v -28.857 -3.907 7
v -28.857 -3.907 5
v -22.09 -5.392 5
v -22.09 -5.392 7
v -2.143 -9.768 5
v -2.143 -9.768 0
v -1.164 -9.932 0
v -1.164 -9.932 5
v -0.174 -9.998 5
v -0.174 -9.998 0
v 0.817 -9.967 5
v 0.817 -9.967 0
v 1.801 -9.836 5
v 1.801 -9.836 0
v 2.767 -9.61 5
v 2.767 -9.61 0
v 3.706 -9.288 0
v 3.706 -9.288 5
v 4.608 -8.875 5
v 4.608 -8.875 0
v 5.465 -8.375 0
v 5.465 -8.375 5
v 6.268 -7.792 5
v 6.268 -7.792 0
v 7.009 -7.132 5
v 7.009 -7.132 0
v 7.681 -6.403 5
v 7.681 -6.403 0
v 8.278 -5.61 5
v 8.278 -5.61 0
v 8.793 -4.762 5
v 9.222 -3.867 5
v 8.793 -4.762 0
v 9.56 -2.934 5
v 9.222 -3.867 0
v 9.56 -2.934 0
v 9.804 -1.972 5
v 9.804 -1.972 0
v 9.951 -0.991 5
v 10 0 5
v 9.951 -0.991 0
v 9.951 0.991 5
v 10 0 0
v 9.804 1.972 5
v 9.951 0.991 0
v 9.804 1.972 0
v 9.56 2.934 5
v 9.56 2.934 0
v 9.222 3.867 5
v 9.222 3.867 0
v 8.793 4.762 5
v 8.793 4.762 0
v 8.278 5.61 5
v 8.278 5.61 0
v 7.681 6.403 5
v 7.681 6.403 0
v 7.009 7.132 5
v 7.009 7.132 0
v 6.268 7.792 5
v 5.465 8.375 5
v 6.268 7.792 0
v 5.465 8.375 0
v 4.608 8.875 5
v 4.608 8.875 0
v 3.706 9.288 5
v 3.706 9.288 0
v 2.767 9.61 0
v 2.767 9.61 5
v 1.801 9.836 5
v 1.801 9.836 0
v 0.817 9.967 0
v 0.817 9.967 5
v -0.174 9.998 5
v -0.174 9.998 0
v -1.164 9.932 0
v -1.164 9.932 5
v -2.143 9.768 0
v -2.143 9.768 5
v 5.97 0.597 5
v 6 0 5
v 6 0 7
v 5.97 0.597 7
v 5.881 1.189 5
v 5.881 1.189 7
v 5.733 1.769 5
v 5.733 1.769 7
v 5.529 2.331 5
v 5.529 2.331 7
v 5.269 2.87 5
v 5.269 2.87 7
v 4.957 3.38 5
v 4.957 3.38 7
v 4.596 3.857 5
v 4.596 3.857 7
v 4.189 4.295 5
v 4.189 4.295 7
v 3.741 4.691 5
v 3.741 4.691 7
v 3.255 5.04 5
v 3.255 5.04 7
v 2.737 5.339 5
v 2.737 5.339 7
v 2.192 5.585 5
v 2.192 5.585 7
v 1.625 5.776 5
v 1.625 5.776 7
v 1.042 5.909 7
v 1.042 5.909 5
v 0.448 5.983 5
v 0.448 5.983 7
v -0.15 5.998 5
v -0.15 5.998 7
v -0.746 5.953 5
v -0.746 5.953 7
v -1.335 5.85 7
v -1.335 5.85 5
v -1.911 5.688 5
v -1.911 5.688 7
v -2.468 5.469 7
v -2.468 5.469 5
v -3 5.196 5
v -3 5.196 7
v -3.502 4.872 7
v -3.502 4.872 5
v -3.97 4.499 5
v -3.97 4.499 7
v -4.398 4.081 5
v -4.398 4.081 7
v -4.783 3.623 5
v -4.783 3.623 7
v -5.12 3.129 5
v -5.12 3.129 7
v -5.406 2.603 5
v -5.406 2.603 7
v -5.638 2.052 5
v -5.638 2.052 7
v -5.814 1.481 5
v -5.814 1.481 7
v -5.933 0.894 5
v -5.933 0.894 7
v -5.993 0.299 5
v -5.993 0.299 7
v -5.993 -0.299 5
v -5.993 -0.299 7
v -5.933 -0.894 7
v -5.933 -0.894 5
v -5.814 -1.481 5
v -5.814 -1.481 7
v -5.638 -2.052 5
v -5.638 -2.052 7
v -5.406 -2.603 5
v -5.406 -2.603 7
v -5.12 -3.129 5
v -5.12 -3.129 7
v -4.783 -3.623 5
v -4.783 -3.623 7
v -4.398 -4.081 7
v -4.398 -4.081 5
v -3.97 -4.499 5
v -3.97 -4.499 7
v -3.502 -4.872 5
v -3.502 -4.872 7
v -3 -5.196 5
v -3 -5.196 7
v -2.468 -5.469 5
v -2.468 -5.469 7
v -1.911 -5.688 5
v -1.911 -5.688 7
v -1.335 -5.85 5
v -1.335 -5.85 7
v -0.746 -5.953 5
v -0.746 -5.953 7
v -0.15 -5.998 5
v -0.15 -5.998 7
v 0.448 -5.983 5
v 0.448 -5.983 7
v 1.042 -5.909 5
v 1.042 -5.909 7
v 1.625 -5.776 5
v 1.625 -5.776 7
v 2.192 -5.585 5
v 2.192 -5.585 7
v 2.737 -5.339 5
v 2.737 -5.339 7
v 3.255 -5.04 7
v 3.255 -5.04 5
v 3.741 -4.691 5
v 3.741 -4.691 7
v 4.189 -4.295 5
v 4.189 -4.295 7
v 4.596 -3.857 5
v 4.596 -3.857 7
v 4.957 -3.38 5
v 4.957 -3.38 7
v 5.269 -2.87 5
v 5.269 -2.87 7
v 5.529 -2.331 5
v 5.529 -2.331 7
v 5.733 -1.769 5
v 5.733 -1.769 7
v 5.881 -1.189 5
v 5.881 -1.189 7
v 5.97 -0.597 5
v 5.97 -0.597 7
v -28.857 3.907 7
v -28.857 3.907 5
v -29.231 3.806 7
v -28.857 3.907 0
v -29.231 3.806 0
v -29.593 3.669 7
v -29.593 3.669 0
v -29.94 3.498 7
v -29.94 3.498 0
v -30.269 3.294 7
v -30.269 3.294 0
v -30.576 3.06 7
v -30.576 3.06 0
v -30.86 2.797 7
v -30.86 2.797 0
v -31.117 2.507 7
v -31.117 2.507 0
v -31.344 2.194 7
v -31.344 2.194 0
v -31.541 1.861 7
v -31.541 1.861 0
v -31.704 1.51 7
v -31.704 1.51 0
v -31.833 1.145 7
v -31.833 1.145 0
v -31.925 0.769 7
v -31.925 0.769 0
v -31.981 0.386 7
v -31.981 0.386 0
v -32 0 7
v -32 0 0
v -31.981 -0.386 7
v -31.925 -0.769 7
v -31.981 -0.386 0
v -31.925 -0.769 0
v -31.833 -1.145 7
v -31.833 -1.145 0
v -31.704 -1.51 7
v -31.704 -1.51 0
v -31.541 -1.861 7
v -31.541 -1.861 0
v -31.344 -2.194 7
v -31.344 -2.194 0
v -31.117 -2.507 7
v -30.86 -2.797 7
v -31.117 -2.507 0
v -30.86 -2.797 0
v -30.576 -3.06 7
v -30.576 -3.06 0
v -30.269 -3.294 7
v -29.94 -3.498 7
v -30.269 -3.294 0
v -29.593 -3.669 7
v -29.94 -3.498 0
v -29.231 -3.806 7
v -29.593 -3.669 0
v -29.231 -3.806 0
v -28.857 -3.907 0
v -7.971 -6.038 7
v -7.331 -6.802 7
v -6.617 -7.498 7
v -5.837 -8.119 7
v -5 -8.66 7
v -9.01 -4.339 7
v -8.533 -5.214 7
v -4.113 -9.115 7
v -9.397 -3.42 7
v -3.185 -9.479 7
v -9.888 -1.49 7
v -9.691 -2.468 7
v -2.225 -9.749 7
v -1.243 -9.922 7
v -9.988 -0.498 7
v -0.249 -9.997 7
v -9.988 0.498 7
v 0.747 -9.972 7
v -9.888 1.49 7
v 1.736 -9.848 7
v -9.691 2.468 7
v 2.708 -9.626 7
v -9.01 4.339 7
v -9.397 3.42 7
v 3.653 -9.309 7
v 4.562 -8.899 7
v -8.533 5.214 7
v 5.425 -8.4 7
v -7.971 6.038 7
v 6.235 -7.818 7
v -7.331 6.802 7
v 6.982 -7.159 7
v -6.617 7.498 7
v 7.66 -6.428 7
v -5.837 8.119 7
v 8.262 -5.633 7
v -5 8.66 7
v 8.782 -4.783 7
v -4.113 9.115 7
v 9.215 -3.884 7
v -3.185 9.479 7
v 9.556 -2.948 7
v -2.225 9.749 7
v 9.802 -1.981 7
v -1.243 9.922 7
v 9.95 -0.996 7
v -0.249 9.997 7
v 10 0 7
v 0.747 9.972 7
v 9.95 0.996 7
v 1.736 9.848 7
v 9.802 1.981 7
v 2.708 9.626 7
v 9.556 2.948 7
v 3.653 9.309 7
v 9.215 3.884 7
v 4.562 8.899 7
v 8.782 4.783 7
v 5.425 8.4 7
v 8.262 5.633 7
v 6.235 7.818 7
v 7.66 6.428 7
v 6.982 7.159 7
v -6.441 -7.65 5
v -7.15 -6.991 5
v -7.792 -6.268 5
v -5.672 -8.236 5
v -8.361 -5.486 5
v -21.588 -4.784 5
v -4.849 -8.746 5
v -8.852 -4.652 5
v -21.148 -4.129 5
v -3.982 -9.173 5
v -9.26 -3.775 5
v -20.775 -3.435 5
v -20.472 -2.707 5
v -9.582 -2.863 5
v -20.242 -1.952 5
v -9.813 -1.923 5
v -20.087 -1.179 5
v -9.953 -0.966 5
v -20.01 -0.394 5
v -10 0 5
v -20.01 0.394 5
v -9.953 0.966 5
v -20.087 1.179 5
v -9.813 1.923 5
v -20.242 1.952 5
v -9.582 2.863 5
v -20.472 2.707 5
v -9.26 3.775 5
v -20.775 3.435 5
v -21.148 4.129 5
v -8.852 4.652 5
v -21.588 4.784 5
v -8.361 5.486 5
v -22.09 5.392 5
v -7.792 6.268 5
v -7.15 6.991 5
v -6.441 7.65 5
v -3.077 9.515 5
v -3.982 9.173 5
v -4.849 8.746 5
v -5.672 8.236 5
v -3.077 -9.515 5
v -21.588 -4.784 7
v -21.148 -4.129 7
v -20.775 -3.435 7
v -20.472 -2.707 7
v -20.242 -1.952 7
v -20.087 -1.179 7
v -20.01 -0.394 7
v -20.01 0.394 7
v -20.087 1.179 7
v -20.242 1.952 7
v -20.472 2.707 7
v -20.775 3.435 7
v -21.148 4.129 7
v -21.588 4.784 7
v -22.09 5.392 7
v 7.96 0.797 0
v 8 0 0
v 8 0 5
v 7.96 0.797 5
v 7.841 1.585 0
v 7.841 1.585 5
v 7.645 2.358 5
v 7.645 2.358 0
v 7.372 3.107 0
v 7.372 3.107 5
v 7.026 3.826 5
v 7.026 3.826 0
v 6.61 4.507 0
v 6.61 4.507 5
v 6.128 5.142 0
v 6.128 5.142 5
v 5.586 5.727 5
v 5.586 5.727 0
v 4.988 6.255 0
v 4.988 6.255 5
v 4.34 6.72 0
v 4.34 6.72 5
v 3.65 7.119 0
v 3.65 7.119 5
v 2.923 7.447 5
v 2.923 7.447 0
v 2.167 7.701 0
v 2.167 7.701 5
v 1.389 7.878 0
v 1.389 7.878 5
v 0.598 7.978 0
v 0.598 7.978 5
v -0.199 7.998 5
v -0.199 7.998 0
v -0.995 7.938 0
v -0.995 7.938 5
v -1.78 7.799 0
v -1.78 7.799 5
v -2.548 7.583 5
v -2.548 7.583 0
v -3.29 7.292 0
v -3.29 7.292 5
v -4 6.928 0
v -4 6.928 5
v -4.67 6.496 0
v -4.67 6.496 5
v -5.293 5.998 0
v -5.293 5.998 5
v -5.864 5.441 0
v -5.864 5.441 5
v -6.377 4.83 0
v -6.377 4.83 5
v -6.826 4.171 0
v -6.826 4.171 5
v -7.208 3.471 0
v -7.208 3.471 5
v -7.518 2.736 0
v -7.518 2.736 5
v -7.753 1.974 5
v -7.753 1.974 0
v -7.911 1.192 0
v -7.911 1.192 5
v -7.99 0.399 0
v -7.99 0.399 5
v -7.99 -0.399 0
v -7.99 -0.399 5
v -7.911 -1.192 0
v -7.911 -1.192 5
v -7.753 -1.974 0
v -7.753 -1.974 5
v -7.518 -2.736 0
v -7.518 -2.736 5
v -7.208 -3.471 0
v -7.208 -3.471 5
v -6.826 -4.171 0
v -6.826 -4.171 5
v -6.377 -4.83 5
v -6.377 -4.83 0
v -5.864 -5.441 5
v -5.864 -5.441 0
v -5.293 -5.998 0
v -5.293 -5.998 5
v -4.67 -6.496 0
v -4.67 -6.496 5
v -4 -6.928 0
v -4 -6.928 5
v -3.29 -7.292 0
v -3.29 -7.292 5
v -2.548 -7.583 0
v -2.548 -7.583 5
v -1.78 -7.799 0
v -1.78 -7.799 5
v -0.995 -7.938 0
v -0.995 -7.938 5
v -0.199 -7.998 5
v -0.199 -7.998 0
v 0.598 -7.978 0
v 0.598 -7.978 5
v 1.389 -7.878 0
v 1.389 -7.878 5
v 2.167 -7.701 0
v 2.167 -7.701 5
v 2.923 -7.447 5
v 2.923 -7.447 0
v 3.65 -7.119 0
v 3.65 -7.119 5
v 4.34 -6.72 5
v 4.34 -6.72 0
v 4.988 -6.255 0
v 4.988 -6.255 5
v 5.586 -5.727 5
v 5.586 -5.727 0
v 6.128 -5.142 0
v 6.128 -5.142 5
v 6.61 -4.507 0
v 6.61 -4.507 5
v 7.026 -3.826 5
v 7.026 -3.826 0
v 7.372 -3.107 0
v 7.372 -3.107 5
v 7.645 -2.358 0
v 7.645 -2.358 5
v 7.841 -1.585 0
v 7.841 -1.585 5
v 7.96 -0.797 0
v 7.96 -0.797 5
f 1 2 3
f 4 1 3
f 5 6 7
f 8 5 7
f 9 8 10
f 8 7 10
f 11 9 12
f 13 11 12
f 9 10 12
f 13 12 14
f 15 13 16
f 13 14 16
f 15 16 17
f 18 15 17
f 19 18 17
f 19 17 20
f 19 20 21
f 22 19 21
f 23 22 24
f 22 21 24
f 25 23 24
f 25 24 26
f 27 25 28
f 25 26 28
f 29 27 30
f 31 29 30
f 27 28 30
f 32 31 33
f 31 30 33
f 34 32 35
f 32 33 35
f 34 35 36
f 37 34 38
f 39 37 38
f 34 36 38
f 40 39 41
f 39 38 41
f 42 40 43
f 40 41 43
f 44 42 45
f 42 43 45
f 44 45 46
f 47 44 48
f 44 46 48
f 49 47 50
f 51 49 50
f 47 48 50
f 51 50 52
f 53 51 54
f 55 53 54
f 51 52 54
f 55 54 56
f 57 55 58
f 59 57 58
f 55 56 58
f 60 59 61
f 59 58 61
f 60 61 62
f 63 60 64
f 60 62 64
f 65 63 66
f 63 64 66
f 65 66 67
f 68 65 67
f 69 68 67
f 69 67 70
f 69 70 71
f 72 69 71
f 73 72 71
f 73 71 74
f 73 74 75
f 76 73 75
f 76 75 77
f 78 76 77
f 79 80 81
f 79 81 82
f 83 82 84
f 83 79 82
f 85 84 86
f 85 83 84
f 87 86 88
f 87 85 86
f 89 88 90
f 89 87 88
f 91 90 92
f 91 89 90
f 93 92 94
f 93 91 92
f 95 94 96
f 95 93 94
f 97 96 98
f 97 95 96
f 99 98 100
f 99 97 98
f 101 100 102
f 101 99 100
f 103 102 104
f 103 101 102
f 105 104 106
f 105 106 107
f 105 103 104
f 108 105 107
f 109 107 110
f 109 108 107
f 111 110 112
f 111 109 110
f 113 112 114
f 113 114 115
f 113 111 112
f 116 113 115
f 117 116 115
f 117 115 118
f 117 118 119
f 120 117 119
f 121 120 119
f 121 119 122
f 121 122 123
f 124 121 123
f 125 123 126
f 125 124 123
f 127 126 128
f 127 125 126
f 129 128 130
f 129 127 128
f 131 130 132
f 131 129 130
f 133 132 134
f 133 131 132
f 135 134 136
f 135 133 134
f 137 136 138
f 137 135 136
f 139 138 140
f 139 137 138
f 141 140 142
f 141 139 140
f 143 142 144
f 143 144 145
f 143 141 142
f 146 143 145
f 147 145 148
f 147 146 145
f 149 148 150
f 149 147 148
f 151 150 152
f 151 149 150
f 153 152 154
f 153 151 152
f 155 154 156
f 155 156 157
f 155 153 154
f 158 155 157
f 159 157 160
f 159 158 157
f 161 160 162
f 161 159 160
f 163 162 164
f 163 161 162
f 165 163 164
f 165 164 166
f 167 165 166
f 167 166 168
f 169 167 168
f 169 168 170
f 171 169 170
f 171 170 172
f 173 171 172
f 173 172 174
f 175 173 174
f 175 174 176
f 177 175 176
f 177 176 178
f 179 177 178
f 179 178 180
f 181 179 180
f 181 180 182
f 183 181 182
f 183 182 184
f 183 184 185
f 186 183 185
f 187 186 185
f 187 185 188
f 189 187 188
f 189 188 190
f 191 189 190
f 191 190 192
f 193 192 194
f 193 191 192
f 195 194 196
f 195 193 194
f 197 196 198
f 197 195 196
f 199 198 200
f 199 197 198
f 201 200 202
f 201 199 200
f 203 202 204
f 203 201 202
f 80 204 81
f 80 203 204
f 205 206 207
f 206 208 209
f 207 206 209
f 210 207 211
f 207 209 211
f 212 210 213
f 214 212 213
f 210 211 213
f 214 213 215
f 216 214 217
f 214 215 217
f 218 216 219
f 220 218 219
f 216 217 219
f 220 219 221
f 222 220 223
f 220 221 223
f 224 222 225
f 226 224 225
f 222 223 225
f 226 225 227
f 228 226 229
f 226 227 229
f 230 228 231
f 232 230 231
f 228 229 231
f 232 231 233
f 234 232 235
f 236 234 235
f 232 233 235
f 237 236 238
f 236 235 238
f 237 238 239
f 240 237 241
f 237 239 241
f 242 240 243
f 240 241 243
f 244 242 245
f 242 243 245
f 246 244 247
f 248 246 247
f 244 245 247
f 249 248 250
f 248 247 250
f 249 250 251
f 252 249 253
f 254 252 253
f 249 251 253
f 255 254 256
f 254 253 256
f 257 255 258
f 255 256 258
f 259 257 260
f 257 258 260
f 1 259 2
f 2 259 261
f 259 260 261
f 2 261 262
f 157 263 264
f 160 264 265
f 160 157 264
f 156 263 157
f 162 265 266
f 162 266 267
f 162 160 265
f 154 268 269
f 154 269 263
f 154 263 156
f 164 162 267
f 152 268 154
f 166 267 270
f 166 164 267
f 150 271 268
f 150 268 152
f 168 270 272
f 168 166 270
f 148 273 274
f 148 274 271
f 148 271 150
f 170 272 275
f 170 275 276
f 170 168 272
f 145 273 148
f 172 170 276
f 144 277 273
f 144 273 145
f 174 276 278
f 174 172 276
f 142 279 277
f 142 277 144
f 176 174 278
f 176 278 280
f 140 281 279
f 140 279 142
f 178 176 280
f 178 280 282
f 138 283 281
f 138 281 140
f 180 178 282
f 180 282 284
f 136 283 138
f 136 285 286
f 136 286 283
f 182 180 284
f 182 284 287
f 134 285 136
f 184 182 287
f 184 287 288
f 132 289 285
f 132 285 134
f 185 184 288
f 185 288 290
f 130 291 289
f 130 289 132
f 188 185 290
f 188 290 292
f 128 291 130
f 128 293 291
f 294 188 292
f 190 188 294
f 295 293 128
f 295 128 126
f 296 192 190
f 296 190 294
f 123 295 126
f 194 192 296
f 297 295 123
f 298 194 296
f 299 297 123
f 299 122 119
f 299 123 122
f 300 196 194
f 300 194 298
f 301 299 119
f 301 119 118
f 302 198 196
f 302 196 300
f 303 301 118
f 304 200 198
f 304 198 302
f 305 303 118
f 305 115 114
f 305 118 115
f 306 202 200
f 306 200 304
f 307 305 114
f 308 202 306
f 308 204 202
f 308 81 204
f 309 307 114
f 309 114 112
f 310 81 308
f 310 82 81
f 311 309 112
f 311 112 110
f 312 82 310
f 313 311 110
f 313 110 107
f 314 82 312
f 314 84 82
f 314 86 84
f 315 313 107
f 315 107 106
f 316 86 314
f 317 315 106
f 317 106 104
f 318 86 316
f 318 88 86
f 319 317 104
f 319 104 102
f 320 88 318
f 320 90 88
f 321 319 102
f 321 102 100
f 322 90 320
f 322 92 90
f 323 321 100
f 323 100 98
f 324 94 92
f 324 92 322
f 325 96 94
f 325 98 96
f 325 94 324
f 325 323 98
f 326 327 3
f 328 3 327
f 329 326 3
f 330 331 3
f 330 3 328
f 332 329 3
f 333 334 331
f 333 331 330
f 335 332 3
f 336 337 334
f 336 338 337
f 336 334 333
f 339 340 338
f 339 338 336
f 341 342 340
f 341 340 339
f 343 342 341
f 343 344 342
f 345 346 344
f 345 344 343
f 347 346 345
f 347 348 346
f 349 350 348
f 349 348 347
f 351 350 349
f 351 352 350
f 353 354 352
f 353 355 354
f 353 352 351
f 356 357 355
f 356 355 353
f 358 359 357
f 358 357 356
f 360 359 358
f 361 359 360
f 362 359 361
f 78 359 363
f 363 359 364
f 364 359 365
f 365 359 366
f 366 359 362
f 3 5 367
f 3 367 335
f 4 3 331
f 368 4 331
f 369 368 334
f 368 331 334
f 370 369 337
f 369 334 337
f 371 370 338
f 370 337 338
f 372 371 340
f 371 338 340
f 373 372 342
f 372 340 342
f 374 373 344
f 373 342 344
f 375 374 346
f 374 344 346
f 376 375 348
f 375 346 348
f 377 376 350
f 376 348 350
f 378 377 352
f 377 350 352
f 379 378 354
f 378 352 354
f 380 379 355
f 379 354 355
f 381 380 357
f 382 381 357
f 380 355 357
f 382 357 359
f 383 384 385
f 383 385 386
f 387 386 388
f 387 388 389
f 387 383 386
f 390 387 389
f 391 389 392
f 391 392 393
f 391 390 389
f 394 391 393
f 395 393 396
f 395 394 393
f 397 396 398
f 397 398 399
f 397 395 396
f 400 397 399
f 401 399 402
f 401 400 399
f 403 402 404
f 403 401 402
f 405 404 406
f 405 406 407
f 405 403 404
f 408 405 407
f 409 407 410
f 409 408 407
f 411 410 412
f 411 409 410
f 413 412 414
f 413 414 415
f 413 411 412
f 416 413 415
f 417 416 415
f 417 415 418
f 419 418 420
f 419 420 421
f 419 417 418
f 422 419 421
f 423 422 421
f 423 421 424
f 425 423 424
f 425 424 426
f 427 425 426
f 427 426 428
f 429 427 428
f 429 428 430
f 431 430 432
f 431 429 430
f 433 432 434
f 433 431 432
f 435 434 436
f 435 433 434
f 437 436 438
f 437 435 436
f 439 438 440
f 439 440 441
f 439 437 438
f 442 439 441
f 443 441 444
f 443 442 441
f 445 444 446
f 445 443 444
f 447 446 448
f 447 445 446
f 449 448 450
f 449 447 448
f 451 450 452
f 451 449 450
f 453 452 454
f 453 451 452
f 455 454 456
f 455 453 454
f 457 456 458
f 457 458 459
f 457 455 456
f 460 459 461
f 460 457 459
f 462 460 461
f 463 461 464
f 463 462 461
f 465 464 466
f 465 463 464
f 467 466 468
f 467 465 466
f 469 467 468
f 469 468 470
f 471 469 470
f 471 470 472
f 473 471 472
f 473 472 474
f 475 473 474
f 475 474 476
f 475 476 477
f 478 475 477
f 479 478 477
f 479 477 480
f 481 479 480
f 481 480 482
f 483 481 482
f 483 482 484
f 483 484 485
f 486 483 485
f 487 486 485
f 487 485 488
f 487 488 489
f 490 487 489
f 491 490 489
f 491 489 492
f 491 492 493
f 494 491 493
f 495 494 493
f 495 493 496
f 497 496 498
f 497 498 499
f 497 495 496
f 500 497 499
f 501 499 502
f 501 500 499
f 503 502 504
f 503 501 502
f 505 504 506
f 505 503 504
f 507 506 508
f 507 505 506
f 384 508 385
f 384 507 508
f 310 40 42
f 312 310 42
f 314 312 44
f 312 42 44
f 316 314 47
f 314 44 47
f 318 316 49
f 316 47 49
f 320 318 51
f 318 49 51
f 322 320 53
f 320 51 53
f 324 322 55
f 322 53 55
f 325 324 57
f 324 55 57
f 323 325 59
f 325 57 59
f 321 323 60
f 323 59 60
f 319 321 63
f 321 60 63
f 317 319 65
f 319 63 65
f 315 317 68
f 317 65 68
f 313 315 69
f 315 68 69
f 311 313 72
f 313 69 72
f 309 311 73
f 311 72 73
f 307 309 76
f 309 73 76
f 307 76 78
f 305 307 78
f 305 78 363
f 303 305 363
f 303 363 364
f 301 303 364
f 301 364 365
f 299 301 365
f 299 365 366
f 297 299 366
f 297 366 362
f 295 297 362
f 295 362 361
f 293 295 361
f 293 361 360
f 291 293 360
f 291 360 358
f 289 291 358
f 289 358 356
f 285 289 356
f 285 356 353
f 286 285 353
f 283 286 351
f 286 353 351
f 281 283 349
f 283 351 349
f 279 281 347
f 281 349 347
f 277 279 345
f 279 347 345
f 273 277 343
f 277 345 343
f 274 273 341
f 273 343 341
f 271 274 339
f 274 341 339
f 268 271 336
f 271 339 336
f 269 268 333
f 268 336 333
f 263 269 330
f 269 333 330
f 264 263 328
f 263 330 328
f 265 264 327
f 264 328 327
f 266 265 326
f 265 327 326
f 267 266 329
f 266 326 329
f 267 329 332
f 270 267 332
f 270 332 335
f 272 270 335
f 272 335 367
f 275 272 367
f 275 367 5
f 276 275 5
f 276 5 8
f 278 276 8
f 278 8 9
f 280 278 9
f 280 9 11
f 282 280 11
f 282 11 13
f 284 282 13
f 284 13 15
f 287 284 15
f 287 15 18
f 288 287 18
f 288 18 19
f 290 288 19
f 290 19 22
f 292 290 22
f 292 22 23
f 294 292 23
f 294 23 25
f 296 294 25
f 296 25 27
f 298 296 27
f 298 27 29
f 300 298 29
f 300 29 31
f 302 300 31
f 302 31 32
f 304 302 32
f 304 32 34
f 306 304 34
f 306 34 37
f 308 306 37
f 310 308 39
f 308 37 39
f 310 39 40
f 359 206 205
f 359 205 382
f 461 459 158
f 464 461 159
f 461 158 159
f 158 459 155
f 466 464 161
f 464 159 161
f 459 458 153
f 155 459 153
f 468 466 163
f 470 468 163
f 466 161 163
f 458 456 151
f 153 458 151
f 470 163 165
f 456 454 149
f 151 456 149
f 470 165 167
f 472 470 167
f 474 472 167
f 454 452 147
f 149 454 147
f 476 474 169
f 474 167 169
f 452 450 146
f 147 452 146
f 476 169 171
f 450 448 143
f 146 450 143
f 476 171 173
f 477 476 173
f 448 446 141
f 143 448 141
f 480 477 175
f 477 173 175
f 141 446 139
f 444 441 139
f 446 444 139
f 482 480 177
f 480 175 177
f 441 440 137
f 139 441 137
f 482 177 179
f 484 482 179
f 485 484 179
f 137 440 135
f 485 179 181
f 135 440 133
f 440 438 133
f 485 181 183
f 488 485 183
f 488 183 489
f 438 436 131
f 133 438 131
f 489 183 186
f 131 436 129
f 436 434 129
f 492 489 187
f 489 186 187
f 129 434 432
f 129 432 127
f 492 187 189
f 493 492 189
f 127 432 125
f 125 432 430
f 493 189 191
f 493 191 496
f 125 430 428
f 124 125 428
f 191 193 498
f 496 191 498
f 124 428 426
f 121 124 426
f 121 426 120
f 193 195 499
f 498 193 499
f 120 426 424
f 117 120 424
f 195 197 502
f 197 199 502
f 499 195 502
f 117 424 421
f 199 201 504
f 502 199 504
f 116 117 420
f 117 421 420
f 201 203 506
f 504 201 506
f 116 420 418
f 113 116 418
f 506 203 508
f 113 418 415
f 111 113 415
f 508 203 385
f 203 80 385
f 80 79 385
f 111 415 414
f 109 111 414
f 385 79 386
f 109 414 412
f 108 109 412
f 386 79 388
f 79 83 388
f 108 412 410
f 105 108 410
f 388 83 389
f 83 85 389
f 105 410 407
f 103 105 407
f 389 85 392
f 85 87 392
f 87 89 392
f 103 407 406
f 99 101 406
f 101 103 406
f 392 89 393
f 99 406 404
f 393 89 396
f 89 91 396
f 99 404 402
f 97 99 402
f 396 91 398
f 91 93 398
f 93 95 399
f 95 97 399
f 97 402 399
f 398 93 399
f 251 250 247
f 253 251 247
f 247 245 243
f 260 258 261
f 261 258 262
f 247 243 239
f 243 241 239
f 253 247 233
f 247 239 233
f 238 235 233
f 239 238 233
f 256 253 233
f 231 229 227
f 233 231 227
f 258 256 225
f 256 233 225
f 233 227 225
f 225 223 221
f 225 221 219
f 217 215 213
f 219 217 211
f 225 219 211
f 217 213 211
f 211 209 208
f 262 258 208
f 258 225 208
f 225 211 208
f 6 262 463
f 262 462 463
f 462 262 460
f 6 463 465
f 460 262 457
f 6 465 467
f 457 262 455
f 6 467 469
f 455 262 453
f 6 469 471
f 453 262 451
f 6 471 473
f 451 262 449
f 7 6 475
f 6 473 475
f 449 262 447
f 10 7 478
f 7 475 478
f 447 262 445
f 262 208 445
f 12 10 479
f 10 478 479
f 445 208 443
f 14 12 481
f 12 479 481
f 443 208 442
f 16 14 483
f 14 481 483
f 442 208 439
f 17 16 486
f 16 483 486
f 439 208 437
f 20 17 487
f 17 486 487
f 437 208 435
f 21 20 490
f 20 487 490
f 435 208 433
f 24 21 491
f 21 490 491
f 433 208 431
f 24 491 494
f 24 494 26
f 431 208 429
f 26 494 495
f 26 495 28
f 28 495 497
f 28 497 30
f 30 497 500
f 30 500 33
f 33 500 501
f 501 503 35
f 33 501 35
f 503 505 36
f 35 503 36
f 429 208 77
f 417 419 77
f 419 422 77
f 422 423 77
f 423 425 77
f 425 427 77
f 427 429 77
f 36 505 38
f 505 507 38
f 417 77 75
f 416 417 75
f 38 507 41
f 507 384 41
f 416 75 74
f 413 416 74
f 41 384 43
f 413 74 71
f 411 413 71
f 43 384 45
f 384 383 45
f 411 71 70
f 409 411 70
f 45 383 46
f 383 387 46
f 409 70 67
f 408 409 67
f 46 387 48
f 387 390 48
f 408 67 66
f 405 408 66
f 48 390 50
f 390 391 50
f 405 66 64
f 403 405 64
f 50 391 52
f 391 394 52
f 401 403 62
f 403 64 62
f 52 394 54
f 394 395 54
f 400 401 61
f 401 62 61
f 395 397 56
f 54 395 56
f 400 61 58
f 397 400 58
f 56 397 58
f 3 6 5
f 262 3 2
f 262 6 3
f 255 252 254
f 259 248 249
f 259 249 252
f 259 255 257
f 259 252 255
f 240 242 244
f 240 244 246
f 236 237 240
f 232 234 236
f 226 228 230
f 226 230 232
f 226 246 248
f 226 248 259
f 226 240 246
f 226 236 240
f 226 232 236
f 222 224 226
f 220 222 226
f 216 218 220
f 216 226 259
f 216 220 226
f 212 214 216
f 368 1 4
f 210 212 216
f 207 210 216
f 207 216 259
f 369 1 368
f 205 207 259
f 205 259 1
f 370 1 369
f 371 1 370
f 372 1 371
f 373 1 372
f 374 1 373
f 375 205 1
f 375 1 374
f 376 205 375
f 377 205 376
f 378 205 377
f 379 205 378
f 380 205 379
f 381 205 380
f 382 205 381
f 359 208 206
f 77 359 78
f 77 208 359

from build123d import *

# Parameters (mm, degrees)
SKETCH_R      = 8
PAD_DEPTH     = 5
SKETCH001_R   = 10
SKETCH001_R_2 = 6
PAD001_DEPTH  = 2
PAD002_DEPTH  = 2


with BuildPart() as part:
    # Sketch → Pad (new body)
    with BuildSketch(Plane.XY):
        with BuildLine():
            ThreePointArc((-2.142857, -9.76771), (10, 0), (-2.142857, 9.76771))
            Line((-28.857143, 3.907084), (-2.142857, 9.76771))
            ThreePointArc((-28.857143, 3.907084), (-32, 0), (-28.857143, -3.907084))
            Line((-2.142857, -9.76771), (-28.857143, -3.907084))
        make_face()
        Circle(SKETCH_R, mode=Mode.SUBTRACT)
    extrude(amount=PAD_DEPTH)

    # Sketch001 (on Face7 of Pad) → Pad001 (join)
    with BuildSketch(Plane.XY.offset(5)):
        Circle(SKETCH001_R)
        Circle(SKETCH001_R_2, mode=Mode.SUBTRACT)
    extrude(amount=PAD001_DEPTH)

    # Sketch002 (on Face7 of Pad001) → Pad002 (join)
    with BuildSketch(Plane.XY.offset(5)):
        with BuildLine():
            ThreePointArc((-28.857143, 3.907084), (-32, 0), (-28.857143, -3.907084))
            Line((-28.857143, -3.907084), (-22.089875, -5.391699))
            ThreePointArc((-22.089875, -5.391699), (-20, 0), (-22.089875, 5.391699))
            Line((-28.857143, 3.907084), (-22.089875, 5.391699))
        make_face()
    extrude(amount=PAD002_DEPTH)


solid = part.part
